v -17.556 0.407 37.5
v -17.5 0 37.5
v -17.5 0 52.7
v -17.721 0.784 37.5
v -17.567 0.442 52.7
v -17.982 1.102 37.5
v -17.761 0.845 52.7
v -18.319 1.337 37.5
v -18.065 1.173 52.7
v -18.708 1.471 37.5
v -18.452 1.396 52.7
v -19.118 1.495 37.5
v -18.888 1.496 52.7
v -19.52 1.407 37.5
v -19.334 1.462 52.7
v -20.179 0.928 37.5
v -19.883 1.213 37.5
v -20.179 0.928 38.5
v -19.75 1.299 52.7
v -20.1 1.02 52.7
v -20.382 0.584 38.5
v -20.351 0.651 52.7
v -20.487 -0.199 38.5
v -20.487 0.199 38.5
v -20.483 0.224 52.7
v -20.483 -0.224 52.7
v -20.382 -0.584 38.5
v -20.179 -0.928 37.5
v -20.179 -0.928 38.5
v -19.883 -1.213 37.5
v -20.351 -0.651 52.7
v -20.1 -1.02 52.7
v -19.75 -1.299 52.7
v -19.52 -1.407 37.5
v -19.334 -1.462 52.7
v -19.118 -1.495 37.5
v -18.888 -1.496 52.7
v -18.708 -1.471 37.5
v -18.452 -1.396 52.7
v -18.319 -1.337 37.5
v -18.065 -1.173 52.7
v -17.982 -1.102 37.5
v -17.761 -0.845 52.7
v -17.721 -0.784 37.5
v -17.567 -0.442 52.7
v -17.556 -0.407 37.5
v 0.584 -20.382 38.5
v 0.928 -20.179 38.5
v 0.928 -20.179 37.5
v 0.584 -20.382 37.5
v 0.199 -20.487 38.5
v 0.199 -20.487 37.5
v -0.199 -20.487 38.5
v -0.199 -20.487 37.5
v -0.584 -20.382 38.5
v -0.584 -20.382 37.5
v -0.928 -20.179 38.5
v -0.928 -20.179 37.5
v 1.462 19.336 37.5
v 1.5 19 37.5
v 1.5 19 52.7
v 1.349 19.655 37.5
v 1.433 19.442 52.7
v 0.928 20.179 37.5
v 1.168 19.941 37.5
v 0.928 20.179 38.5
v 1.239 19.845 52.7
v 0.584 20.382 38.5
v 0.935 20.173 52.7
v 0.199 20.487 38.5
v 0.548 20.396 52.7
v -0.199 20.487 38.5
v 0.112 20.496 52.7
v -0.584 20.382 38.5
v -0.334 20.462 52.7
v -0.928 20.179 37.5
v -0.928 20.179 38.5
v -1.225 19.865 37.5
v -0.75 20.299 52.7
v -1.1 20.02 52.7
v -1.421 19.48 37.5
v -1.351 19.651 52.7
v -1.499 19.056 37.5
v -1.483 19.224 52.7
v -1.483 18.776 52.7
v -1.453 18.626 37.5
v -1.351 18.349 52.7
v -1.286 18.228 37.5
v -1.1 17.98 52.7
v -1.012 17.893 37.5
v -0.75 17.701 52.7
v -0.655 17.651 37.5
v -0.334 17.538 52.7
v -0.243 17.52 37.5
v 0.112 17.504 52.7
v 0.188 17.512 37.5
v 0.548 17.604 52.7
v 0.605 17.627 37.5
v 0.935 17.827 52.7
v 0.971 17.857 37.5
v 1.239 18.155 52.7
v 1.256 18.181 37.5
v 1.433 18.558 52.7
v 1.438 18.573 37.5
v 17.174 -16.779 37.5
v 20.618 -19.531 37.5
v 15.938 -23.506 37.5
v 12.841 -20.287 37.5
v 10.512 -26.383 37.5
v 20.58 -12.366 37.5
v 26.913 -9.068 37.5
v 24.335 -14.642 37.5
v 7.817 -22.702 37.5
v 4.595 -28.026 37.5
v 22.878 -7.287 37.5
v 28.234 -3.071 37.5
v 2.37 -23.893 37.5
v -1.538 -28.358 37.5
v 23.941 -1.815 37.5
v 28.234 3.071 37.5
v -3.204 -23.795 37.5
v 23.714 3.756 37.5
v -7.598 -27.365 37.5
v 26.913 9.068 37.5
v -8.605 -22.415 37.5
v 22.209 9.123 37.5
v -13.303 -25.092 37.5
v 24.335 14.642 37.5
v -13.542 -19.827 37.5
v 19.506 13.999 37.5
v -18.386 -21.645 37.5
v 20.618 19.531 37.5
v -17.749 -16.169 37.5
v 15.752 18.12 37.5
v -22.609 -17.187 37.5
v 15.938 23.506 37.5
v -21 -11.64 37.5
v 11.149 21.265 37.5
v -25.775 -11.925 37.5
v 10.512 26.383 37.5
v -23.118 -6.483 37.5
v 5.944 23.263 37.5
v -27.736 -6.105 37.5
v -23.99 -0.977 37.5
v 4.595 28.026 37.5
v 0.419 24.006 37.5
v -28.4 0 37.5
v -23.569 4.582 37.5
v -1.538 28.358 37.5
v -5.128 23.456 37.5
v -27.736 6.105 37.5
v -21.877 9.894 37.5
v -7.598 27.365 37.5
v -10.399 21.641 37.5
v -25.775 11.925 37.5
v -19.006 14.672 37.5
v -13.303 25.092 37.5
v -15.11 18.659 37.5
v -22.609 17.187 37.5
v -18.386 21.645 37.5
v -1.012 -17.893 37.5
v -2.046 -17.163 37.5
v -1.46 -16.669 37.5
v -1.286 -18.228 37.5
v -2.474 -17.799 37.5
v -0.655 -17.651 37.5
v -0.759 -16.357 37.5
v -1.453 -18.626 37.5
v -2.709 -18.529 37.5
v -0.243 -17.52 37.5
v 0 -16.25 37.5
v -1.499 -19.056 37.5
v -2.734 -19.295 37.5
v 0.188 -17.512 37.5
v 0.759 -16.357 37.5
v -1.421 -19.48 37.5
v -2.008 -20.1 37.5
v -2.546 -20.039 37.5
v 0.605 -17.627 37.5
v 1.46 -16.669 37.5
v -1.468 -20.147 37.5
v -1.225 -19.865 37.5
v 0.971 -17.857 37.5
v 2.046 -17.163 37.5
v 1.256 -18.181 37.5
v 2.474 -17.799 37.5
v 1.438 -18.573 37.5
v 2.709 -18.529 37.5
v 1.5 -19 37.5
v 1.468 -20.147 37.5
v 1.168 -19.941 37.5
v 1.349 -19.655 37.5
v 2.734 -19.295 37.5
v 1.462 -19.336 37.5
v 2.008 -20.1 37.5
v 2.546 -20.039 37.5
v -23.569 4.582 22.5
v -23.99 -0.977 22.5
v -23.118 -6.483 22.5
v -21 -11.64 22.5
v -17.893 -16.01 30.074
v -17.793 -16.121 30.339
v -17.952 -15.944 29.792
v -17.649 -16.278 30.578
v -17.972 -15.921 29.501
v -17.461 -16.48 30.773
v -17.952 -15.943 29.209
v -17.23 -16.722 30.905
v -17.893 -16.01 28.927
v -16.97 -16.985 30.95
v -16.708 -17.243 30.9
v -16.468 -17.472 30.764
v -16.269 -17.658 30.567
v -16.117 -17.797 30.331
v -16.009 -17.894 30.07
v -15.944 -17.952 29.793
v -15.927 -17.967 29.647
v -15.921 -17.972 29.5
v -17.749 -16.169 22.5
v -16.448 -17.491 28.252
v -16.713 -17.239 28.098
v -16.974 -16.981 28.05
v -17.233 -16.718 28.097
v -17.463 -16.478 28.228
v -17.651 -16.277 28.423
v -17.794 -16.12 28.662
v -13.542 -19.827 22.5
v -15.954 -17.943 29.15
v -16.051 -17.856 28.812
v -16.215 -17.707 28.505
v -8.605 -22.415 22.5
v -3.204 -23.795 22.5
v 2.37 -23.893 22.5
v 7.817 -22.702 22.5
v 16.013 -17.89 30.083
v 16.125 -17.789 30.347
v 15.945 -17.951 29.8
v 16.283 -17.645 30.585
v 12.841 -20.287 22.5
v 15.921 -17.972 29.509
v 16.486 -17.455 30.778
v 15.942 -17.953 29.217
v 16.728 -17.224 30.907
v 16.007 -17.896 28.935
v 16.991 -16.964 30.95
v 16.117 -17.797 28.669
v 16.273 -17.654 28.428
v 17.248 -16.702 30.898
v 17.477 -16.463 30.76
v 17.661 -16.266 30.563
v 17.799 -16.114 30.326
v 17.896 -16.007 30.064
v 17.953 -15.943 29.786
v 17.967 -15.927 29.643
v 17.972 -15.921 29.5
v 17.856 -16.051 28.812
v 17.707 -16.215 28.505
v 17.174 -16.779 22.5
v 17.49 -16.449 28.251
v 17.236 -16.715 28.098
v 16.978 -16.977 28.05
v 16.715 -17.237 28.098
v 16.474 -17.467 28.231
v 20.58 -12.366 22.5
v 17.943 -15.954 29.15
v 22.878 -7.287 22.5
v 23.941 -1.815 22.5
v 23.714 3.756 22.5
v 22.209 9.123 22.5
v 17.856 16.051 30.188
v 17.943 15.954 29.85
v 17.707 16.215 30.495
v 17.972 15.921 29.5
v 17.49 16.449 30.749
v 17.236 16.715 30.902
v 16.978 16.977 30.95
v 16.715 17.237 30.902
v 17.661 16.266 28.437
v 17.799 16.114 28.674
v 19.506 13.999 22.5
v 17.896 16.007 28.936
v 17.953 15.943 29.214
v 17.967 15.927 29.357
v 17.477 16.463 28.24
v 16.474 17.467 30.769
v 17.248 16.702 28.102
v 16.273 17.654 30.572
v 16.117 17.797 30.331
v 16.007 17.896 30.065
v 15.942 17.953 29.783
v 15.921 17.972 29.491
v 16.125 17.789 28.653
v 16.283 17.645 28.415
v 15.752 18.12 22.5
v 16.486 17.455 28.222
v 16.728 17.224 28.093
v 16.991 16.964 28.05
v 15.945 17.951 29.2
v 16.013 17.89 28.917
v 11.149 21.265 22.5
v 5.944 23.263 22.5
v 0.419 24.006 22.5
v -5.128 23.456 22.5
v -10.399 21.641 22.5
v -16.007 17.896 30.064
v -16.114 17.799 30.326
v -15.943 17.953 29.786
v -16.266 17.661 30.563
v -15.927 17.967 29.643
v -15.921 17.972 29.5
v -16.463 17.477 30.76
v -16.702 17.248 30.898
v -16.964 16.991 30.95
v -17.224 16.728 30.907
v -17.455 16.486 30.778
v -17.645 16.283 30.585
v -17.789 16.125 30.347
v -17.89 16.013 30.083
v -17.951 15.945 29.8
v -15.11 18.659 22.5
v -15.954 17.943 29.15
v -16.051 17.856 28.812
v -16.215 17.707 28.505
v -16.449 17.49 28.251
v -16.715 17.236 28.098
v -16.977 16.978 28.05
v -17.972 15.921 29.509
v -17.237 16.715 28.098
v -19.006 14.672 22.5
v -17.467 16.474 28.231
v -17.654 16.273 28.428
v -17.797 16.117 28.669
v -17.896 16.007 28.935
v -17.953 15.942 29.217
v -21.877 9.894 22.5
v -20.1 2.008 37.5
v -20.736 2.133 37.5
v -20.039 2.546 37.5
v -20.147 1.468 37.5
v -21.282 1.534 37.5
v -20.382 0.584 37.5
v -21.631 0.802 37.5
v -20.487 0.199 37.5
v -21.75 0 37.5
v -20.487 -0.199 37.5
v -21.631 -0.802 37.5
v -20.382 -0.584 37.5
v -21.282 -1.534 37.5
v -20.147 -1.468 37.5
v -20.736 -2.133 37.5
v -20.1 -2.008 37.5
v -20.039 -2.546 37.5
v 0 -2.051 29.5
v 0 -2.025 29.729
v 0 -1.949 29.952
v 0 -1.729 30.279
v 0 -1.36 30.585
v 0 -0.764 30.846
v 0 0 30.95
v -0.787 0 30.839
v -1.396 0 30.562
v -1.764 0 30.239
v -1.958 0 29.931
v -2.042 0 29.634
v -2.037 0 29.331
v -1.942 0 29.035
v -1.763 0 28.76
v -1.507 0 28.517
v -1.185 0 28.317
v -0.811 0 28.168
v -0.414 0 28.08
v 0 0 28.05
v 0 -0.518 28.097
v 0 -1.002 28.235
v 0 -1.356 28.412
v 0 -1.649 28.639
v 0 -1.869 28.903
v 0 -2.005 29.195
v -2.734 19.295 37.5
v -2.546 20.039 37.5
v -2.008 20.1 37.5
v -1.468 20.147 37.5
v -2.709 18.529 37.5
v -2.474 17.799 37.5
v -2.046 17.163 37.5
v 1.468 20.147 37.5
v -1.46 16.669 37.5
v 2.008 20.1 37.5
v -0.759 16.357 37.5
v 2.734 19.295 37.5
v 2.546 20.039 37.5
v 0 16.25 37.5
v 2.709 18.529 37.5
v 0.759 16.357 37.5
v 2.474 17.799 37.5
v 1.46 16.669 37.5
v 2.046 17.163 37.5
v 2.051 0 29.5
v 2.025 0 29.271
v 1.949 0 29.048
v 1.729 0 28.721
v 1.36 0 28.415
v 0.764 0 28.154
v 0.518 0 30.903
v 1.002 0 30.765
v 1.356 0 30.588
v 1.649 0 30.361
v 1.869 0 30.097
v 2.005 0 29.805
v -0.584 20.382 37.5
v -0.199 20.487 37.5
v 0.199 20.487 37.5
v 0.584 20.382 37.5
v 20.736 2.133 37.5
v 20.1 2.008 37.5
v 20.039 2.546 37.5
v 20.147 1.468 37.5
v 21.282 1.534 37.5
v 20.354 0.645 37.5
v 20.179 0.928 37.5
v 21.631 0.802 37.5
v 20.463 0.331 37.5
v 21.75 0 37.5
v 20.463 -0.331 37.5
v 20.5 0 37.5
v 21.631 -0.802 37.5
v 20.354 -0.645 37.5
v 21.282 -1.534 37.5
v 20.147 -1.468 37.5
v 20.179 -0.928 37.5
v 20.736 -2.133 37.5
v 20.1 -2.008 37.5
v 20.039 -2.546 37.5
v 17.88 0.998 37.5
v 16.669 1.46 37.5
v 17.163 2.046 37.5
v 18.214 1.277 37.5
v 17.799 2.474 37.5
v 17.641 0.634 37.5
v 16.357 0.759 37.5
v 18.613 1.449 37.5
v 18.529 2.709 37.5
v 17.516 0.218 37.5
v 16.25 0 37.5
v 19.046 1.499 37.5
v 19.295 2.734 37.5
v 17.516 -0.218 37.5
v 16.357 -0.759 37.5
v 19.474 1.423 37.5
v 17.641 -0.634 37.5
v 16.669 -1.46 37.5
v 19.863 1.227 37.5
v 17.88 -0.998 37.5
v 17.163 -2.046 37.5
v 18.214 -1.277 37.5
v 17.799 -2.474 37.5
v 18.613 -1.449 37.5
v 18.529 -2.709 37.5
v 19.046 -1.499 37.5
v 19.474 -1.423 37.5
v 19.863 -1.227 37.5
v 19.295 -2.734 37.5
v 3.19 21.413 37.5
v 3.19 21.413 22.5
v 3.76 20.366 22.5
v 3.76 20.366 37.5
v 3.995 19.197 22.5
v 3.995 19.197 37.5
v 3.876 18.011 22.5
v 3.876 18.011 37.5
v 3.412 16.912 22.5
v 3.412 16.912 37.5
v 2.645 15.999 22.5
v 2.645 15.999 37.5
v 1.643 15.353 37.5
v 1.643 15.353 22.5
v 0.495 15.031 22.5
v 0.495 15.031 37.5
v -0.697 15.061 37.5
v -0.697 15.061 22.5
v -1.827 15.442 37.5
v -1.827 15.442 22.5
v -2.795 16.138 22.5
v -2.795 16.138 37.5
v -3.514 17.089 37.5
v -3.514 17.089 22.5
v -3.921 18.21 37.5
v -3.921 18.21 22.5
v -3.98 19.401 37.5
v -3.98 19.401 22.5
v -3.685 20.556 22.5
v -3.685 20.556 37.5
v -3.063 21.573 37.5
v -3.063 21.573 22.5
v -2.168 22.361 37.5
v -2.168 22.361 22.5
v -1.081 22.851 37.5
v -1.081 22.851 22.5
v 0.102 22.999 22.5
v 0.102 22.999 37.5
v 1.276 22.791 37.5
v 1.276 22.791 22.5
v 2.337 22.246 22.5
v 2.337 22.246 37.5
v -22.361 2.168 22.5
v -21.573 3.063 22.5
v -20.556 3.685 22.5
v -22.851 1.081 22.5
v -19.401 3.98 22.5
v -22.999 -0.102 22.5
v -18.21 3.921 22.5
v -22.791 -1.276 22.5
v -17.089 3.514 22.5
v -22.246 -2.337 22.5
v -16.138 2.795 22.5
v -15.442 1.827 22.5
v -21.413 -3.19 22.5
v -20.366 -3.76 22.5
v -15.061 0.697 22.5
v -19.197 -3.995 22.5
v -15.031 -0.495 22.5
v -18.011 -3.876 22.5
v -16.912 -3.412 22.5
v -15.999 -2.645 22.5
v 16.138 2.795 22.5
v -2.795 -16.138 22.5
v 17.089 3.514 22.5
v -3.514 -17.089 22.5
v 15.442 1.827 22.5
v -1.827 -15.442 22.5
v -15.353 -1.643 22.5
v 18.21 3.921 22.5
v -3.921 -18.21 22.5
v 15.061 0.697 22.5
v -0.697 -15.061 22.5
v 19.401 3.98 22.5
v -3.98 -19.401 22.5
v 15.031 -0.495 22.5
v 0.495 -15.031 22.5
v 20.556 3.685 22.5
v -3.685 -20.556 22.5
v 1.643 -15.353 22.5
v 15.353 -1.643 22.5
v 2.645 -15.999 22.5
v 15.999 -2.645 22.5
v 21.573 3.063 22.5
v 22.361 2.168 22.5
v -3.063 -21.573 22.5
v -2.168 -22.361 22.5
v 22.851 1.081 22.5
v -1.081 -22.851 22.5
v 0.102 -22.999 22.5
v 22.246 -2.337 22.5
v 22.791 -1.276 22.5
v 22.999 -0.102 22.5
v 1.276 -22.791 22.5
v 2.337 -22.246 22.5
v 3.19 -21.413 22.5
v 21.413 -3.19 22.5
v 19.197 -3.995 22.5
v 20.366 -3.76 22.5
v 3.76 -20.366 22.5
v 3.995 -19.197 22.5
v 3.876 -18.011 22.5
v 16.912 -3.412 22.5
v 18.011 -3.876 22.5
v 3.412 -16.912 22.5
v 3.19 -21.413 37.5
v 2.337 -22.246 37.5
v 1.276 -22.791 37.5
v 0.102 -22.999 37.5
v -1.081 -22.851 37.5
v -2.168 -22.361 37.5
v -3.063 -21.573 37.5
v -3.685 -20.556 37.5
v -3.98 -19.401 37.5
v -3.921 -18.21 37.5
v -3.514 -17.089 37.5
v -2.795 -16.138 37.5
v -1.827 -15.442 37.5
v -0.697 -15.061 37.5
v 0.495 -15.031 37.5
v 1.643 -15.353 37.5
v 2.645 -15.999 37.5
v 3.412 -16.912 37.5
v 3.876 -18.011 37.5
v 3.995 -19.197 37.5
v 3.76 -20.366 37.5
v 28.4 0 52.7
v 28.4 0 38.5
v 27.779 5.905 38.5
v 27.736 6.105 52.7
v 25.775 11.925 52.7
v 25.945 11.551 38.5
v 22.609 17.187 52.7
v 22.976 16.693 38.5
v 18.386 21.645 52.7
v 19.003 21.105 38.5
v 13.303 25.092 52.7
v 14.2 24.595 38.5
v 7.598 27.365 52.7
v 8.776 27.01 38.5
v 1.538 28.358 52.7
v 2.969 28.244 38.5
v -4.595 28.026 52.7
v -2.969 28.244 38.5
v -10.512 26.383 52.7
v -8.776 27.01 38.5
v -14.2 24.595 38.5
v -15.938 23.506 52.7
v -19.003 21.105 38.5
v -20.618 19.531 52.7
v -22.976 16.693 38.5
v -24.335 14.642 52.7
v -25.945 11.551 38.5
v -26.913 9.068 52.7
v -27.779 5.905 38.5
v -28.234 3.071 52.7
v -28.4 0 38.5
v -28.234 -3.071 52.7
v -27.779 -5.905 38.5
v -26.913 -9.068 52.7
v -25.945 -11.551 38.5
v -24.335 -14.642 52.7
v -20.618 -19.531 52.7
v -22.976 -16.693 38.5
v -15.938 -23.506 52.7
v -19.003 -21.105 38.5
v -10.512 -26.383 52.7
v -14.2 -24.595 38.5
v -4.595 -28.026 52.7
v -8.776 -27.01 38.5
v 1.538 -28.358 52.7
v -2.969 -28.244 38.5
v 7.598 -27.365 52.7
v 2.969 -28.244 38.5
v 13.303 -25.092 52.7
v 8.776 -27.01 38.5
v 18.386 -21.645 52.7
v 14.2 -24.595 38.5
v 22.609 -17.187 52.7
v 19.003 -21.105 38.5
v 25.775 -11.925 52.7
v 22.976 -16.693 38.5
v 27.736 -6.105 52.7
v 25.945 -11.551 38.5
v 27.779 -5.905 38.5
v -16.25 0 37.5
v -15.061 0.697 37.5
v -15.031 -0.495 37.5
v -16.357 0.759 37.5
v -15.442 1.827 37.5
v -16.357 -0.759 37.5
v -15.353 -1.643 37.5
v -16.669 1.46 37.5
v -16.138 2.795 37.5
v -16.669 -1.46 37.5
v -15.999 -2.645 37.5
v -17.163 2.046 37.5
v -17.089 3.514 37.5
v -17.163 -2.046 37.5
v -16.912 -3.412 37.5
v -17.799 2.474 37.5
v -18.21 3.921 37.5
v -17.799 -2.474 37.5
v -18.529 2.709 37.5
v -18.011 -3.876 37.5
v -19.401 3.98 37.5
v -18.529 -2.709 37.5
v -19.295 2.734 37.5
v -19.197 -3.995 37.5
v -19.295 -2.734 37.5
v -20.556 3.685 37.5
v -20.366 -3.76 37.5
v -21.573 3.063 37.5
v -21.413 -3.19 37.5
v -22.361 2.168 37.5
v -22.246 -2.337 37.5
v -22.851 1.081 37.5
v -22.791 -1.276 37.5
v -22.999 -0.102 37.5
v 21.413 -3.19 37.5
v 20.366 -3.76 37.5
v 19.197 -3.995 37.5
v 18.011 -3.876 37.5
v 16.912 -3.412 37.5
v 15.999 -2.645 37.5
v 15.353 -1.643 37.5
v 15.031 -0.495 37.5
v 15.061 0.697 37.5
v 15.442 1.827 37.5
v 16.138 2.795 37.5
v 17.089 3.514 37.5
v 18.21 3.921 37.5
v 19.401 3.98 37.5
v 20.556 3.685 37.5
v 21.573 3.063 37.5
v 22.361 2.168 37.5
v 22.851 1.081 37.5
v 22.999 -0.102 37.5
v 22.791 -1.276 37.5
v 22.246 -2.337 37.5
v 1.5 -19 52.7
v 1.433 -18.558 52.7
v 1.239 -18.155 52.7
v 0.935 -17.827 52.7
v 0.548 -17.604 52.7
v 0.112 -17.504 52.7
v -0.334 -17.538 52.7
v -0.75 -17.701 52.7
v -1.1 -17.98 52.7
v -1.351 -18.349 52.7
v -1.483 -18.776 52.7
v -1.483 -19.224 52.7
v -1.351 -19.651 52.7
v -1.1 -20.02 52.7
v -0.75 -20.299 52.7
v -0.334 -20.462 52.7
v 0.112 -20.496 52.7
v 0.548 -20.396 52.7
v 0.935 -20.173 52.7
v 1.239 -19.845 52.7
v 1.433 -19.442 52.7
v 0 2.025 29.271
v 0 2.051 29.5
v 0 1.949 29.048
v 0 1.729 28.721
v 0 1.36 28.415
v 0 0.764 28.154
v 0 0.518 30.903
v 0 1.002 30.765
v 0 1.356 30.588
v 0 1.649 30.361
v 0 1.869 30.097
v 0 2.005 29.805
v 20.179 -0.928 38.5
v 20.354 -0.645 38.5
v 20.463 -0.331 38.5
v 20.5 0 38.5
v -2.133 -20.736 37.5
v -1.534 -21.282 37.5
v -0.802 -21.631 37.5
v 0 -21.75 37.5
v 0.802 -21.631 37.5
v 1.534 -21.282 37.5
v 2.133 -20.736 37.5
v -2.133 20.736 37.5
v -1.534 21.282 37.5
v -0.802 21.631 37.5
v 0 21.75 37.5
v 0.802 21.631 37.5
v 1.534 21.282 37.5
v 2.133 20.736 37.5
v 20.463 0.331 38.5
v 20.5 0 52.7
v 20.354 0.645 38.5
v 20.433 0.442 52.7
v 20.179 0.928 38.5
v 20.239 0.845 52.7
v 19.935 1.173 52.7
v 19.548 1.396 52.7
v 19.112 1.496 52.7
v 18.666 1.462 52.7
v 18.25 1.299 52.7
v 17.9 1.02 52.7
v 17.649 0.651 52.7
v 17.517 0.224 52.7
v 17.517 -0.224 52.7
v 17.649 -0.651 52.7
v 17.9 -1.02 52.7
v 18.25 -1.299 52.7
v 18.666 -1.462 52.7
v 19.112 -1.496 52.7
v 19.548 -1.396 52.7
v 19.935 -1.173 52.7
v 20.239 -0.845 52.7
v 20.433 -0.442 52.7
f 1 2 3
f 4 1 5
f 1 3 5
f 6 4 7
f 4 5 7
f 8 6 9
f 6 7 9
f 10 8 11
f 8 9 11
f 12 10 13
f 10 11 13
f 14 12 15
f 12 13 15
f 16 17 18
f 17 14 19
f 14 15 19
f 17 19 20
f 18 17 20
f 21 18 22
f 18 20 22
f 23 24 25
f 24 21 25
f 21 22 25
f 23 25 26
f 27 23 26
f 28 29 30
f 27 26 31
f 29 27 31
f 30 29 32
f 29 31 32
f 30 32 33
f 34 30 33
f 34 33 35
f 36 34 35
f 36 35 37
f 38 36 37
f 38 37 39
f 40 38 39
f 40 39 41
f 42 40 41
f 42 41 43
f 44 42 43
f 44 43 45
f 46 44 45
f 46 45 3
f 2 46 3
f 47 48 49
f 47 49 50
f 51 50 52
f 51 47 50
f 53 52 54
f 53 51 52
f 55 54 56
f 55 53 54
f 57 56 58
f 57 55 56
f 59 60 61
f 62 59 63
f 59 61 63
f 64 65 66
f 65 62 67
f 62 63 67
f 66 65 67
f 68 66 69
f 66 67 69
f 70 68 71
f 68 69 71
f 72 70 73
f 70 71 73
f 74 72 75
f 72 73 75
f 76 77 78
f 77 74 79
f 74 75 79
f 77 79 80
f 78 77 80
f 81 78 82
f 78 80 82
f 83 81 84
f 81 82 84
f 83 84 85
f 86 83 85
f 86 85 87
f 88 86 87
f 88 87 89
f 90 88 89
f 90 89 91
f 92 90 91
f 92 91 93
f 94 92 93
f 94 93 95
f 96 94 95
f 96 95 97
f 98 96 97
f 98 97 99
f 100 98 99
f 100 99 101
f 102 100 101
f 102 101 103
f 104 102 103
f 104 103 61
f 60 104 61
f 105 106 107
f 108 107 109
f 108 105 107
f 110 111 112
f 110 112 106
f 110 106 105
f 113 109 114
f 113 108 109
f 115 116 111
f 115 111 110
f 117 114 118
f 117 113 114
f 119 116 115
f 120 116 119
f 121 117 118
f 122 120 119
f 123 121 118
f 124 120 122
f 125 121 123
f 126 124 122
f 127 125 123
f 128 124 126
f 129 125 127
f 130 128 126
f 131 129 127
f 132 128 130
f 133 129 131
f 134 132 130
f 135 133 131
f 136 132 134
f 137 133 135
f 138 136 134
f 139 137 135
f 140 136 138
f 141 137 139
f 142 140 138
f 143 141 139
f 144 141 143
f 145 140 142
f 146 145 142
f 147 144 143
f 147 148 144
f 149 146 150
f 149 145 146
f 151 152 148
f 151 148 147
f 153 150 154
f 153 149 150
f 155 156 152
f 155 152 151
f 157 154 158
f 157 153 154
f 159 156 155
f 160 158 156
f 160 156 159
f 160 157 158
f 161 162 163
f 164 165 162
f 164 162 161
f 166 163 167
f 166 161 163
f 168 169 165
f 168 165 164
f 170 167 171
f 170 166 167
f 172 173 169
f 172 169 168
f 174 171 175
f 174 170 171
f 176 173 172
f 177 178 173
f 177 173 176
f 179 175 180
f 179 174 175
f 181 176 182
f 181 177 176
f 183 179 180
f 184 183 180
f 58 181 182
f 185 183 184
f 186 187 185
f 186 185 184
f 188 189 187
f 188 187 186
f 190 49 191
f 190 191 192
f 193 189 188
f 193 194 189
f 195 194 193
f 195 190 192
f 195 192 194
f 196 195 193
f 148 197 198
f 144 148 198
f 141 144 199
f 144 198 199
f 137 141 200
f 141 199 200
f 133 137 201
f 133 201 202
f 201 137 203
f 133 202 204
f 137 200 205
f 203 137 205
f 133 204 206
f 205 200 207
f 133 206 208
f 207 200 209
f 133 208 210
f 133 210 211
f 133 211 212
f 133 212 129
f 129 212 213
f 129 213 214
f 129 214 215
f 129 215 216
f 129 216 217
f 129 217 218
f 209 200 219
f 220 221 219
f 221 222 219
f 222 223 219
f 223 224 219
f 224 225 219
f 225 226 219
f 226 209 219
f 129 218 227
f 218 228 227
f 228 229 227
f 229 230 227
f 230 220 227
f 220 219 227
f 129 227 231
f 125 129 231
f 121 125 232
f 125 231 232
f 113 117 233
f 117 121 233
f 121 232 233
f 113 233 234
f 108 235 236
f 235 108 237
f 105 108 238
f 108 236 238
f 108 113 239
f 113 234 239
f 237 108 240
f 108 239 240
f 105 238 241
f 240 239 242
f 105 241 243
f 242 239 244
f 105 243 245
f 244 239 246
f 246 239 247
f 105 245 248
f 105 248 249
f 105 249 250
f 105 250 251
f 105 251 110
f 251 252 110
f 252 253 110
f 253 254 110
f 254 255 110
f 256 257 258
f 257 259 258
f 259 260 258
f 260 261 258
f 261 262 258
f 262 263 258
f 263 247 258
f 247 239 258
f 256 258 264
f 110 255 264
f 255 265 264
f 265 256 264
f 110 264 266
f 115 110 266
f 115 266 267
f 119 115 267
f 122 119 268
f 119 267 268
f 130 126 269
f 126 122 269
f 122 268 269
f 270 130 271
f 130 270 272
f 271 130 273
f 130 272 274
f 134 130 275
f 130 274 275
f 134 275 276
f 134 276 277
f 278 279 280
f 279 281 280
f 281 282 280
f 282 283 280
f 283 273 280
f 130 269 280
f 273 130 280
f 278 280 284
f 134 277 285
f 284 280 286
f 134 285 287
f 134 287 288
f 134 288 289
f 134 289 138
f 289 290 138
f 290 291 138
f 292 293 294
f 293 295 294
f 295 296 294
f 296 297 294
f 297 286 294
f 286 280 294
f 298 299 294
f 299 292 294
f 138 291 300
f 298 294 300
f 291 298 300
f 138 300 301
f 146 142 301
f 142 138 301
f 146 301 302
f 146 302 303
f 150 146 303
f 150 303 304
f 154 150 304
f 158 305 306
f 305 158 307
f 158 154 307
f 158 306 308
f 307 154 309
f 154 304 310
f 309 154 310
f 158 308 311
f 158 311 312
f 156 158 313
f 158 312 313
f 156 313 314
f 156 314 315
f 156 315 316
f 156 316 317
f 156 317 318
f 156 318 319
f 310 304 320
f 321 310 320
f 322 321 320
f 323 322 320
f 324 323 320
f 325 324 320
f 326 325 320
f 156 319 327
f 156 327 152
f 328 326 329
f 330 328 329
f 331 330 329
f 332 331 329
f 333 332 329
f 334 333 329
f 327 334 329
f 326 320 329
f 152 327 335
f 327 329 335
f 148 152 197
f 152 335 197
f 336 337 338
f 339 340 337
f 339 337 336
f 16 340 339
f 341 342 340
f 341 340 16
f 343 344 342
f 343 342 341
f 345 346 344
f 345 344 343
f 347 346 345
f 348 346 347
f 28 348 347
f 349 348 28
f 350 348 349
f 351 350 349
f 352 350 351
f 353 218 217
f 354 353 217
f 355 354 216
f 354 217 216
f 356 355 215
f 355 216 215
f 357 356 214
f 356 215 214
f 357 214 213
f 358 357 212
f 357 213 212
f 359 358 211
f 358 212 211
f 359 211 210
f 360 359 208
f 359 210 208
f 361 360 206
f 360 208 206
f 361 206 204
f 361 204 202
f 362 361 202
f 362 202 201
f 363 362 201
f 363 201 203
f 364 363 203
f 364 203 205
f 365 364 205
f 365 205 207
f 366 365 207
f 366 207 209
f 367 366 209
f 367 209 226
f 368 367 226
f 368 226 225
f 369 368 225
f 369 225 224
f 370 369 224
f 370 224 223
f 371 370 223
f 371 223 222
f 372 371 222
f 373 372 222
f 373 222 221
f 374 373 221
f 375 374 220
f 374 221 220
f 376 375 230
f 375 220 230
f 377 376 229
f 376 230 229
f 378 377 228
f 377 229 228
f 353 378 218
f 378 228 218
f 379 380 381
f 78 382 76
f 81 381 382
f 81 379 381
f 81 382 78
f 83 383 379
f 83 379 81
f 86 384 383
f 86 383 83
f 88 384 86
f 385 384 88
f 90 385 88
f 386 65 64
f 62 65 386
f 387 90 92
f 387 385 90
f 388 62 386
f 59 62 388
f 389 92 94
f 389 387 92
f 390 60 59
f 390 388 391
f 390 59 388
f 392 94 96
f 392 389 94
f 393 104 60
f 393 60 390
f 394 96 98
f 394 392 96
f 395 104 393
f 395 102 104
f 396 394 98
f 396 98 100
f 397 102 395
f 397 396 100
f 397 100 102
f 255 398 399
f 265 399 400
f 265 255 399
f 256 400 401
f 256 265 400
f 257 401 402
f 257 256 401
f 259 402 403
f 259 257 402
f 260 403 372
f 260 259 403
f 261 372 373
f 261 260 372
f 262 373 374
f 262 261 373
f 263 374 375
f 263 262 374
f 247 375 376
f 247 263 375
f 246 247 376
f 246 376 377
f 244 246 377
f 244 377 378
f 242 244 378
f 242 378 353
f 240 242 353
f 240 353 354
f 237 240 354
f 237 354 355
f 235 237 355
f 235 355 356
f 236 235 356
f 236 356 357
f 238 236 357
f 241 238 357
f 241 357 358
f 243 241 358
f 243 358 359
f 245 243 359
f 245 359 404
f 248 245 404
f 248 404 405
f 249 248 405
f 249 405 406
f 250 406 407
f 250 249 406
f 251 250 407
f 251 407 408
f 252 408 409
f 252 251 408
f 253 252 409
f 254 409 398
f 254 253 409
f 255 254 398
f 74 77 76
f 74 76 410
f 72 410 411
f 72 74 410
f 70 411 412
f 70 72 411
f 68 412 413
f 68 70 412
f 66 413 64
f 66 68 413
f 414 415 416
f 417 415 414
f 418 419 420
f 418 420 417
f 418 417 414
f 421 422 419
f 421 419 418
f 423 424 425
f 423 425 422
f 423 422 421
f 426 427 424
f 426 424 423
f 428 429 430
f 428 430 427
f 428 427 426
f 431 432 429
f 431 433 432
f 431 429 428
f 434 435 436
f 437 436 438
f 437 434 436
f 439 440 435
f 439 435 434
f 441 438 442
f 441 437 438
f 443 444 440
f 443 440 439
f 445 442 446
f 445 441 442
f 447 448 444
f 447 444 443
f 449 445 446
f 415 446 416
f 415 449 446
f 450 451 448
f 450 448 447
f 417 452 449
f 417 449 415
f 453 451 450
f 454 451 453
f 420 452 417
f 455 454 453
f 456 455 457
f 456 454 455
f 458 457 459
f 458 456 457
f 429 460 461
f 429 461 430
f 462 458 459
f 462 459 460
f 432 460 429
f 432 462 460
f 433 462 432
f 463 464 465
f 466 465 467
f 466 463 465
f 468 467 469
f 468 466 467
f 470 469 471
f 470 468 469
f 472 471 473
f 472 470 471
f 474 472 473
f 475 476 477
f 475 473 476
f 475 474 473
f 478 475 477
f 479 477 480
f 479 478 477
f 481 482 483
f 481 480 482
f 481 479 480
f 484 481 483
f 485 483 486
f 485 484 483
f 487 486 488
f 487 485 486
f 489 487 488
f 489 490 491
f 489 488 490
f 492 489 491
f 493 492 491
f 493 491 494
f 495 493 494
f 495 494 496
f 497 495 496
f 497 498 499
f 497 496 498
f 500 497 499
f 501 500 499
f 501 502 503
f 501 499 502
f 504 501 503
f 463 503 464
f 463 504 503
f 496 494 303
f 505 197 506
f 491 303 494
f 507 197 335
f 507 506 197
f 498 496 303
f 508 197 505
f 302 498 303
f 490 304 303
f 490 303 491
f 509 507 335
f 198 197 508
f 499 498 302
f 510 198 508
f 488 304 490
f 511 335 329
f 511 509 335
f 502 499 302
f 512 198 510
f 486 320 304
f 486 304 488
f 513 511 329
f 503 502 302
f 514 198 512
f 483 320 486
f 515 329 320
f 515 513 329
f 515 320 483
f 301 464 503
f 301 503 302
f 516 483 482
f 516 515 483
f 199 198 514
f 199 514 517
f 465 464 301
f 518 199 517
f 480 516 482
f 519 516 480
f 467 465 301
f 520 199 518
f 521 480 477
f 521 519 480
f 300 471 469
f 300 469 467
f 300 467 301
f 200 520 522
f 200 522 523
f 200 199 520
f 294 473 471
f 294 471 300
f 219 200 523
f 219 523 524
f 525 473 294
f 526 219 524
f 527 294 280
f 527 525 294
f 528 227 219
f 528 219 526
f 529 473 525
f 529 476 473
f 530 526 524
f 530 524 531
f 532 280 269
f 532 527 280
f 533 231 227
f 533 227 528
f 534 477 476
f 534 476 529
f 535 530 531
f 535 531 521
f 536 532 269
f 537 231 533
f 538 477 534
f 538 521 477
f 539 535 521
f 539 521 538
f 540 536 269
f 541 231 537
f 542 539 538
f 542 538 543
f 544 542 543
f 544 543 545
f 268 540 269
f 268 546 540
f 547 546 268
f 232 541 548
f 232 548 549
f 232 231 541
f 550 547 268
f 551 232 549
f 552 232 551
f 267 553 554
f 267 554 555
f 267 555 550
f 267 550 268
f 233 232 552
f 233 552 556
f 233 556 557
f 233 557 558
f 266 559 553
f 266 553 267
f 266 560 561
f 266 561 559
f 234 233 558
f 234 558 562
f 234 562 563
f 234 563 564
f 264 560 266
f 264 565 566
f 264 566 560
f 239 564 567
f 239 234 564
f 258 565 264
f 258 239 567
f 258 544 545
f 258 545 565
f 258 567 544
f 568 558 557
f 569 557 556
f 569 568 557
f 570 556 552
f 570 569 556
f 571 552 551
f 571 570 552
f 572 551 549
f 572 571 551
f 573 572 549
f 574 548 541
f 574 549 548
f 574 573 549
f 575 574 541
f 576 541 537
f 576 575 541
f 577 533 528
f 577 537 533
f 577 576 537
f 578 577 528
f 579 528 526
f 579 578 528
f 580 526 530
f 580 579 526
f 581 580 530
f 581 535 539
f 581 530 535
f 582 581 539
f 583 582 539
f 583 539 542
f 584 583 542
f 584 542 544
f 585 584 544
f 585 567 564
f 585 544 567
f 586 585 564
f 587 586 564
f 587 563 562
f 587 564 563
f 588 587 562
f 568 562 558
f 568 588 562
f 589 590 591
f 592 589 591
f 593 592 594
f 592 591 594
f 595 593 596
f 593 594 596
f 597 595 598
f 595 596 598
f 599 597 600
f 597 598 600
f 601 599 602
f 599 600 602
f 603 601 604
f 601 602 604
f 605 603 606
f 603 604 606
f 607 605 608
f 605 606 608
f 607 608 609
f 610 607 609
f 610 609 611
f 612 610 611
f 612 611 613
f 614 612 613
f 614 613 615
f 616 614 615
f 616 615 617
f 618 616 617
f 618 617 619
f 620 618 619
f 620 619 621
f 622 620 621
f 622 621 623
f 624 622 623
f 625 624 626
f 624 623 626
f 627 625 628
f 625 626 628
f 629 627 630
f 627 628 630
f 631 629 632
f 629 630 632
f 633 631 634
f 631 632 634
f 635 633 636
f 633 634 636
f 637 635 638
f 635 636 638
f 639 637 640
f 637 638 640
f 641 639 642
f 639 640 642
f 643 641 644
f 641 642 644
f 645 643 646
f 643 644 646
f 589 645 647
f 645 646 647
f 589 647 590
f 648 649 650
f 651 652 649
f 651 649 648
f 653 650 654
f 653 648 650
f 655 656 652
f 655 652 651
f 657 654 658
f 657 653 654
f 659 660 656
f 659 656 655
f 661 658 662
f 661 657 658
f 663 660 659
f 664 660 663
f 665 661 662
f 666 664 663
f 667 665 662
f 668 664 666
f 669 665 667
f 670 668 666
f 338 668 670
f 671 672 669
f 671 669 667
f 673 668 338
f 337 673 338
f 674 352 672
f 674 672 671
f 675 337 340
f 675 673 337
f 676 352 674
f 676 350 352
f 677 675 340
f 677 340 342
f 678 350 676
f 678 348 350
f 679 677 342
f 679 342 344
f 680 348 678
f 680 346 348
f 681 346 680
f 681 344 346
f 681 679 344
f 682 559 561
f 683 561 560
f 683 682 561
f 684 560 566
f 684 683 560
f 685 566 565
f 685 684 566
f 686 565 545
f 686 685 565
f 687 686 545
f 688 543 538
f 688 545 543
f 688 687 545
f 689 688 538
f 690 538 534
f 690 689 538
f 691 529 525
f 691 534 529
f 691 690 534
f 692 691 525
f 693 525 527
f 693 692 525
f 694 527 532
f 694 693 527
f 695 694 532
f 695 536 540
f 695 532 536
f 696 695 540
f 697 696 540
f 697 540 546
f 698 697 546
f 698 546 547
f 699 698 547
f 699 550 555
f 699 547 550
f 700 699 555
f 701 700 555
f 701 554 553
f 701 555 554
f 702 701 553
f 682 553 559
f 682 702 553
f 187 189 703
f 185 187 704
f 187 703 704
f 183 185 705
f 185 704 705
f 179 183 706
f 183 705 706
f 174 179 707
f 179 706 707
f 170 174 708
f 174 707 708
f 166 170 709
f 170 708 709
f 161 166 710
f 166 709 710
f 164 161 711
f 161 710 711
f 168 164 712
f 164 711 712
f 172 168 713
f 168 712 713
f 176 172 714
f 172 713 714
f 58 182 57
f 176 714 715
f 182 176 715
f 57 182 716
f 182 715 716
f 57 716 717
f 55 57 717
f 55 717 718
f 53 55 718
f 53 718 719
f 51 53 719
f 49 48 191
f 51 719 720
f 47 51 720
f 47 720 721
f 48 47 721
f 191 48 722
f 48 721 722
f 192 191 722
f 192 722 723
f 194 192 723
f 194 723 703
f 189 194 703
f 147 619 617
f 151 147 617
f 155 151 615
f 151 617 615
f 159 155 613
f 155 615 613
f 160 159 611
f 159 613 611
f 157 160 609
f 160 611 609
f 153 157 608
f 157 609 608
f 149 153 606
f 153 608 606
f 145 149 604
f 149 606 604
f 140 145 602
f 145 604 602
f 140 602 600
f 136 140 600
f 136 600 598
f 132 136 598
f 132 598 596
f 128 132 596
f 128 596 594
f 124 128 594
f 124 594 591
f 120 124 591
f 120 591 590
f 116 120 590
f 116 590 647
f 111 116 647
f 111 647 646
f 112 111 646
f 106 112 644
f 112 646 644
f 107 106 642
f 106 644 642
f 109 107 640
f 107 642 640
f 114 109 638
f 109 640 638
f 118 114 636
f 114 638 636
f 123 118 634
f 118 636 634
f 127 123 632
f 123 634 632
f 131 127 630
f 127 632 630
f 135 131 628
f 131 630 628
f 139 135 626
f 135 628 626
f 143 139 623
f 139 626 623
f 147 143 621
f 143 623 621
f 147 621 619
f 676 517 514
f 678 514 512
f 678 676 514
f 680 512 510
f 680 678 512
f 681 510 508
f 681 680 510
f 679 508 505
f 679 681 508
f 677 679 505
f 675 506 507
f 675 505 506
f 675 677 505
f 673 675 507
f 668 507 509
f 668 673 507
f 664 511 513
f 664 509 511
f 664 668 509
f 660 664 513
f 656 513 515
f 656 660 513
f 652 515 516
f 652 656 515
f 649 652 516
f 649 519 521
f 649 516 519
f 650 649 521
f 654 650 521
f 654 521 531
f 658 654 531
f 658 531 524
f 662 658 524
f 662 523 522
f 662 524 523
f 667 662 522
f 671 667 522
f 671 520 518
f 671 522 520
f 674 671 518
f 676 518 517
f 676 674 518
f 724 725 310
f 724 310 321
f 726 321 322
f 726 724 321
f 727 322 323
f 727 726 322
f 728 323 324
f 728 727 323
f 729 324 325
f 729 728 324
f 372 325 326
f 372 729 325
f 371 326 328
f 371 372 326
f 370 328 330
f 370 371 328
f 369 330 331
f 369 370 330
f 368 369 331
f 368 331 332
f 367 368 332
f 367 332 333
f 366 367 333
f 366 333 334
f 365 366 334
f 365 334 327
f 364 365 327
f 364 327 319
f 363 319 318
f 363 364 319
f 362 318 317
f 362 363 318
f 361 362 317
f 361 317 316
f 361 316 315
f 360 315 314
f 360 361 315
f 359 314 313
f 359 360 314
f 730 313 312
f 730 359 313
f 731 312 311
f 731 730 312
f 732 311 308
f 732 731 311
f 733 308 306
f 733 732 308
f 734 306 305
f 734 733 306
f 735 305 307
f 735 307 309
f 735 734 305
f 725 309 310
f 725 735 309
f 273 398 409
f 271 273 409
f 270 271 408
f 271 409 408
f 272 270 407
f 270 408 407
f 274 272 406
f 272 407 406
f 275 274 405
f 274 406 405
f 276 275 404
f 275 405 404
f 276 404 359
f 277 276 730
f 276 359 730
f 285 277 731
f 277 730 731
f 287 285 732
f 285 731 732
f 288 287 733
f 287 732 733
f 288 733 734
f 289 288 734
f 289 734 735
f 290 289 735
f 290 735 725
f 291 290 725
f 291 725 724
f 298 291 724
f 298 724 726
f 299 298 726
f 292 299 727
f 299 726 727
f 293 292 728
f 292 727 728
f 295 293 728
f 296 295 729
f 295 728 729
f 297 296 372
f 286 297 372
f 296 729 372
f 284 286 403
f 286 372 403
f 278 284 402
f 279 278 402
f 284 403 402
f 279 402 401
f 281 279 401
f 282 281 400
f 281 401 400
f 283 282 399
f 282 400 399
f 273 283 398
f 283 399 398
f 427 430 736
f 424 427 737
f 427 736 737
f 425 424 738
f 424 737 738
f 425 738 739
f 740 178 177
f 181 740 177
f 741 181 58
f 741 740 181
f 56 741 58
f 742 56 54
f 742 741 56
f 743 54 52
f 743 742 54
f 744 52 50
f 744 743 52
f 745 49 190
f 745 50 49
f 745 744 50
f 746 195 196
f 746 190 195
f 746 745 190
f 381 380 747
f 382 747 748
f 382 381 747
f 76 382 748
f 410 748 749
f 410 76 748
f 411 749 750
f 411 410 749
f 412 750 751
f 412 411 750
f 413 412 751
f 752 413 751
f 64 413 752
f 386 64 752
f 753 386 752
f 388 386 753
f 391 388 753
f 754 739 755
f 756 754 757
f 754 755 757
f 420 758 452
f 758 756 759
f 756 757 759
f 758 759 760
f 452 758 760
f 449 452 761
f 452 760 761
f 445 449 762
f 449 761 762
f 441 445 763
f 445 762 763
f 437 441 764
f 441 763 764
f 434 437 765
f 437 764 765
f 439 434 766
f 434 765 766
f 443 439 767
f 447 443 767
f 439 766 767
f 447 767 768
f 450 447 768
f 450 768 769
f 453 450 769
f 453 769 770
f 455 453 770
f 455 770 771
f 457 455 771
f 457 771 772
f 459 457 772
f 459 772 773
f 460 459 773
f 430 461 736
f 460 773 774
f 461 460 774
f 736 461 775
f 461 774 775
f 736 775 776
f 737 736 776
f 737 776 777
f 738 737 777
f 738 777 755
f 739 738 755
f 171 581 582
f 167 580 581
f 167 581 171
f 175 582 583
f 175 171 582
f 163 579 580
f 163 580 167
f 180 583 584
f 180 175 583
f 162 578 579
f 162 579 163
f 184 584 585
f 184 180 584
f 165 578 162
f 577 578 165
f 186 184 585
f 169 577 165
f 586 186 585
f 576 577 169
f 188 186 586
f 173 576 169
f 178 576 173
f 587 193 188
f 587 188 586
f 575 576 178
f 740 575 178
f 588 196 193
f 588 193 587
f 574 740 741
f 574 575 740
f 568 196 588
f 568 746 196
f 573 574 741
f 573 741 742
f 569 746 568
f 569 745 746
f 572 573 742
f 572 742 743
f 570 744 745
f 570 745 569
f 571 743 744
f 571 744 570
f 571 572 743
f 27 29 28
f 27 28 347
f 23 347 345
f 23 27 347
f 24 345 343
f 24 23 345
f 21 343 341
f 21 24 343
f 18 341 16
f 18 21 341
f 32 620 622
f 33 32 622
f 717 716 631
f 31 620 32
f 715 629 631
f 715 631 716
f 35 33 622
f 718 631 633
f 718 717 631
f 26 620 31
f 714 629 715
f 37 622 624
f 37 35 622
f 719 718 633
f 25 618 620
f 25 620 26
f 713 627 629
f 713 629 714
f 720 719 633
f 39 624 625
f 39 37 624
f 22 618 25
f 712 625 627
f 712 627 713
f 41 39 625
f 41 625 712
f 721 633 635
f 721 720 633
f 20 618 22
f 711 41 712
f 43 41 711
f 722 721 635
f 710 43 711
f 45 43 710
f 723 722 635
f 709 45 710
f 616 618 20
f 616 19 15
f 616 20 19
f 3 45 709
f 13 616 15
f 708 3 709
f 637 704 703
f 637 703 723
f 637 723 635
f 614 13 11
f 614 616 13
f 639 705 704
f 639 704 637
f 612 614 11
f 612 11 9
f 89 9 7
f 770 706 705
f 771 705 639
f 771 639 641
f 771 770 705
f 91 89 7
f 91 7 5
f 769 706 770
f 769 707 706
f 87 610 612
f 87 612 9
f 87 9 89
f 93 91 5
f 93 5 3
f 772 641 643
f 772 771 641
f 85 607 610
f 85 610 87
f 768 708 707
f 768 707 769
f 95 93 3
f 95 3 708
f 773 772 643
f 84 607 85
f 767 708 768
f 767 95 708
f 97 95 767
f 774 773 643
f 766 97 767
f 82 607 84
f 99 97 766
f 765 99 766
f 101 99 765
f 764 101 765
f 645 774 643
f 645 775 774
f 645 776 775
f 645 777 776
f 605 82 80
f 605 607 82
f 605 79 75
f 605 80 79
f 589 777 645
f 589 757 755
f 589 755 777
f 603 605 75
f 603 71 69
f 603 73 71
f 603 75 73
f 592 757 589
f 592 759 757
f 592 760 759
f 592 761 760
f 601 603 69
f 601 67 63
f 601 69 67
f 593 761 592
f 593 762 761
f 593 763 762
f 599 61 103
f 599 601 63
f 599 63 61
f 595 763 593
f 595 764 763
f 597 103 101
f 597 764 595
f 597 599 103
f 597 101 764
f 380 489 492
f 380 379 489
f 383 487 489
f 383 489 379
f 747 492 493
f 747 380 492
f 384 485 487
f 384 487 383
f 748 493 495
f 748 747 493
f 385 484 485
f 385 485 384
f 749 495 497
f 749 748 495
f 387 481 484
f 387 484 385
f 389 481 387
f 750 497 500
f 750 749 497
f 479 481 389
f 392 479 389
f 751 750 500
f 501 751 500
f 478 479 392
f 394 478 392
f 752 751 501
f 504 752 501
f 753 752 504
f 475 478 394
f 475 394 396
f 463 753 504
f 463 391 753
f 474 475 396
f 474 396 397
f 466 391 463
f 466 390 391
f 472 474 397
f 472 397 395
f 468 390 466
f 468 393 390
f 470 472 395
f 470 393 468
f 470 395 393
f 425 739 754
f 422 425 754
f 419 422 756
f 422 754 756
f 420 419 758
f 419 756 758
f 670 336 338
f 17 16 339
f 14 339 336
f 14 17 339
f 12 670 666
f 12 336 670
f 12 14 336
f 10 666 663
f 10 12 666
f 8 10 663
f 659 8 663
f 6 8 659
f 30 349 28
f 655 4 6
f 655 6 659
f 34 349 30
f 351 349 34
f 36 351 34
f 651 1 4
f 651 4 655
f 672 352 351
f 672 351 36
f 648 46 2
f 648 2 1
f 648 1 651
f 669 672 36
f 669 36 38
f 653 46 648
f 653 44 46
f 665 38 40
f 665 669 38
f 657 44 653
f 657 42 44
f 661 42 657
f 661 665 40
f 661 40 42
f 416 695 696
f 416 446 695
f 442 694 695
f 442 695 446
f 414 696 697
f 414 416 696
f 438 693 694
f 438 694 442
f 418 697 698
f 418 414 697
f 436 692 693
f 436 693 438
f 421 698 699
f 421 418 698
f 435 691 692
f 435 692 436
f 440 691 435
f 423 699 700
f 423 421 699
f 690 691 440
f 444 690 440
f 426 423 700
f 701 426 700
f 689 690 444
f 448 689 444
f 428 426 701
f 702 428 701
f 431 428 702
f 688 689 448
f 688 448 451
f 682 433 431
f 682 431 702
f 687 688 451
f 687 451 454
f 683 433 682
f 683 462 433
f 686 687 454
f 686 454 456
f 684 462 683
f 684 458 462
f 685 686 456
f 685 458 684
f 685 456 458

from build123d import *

# Parameters (mm, degrees)
SKETCH_1_R               = 37.5
EXTRUDE_1_DEPTH          = 15.5
SKETCH_2_R               = 3
CUT_EXTRUDE_1_DEPTH      = 16
SKETCH_4_R               = 4.8
CUT_EXTRUDE_2_DEPTH      = 4.5
SKETCH_6_R               = 24.01
EXTRUDE_2_DEPTH          = 23
SKETCH_7_R               = 28.4
EXTRUDE_3_DEPTH          = 14.2
SKETCH_5_R               = 1.5
CUT_EXTRUDE_3_DEPTH      = 33
SKETCH_9_R               = 2.75
CUT_EXTRUDE_6_DEPTH      = 58
EXTRUDE_START            = -1
SKETCH_10_R              = 28.4
EXTRUDE_5_DEPTH          = 1
SKETCH_11_R              = 4
CUT_EXTRUDE_7_DEPTH      = 22
CUT_EXTRUDE_9_DEPTH      = 74
CUT_EXTRUDE_9_DEPTH_BACK = 74
SKETCH_15_R              = 1.45
CUT_EXTRUDE_10_DEPTH     = 74
SKETCH_16_R              = 1.45
CUT_EXTRUDE_11_DEPTH     = 74


with BuildPart() as part:
    # 草图1 → 凸台-拉伸1 (new body)
    with BuildSketch(Plane.XY):
        Circle(SKETCH_1_R)
    extrude(amount=EXTRUDE_1_DEPTH)

    # 草图2 → 切除-拉伸1 (cut)
    with BuildSketch(Plane(origin=(0, 0, 0), x_dir=(-1, 0, 0), z_dir=(0, 0, -1))):
        with Locations((-25, 0)):
            Circle(SKETCH_2_R)
        with Locations((25, 0)):
            Circle(SKETCH_2_R)
        with Locations((0, 25)):
            Circle(SKETCH_2_R)
        with Locations((0, -25)):
            Circle(SKETCH_2_R)
    extrude(amount=-CUT_EXTRUDE_1_DEPTH, mode=Mode.SUBTRACT)

    # 草图4 → 切除-拉伸2 (cut)
    with BuildSketch(Plane.XY.offset(15.5)):
        with Locations((-25, 0)):
            Circle(SKETCH_4_R)
        with Locations((25, 0)):
            Circle(SKETCH_4_R)
        with Locations((0, 25)):
            Circle(SKETCH_4_R)
        with Locations((0, -25)):
            Circle(SKETCH_4_R)
    extrude(amount=-CUT_EXTRUDE_2_DEPTH, mode=Mode.SUBTRACT)

    # 草图6 → 凸台-拉伸2 (add)
    with BuildSketch(Plane.XY.offset(15.5)):
        Circle(SKETCH_6_R)
    extrude(amount=EXTRUDE_2_DEPTH)

    # 草图7 → 凸台-拉伸3 (add)
    with BuildSketch(Plane.XY.offset(38.5)):
        Circle(SKETCH_7_R)
    extrude(amount=EXTRUDE_3_DEPTH)

    # 草图5 → 切除-拉伸3 (cut)
    with BuildSketch(Plane.XY.offset(52.7)):
        with Locations((-19, 0)):
            Circle(SKETCH_5_R)
        with Locations((19, 0)):
            Circle(SKETCH_5_R)
        with Locations((0, 19)):
            Circle(SKETCH_5_R)
        with Locations((0, -19)):
            Circle(SKETCH_5_R)
    extrude(amount=-CUT_EXTRUDE_3_DEPTH, mode=Mode.SUBTRACT)

    # 草图9 → 切除-拉伸6 (cut)
    with BuildSketch(Plane(origin=(0, 0, 37.5), x_dir=(-1, 0, 0), z_dir=(0, 0, -1))):
        with Locations((-19, 0)):
            Circle(SKETCH_9_R)
        with Locations((0, 19)):
            Circle(SKETCH_9_R)
        with Locations((19, 0)):
            Circle(SKETCH_9_R)
        with Locations((0, -19)):
            Circle(SKETCH_9_R)
    extrude(amount=CUT_EXTRUDE_6_DEPTH, mode=Mode.SUBTRACT)

    # 草图10 → 凸台-拉伸5 (add)
    with BuildSketch(Plane(origin=(0, 0, 37.5), x_dir=(-1, 0, 0), z_dir=(0, 0, -1)).offset(EXTRUDE_START)):
        Circle(SKETCH_10_R)
        with BuildLine():
            ThreePointArc((-0.927741091, -20.178684211), (0, -20.5), (0.927741091, -20.178684211))
            ThreePointArc((0.927741091, -20.178684211), (14.28355698, -14.28355698), (20.178684211, -0.927741091))
            ThreePointArc((20.178684211, -0.927741091), (20.5, 0), (20.178684211, 0.927741091))
            ThreePointArc((20.178684211, 0.927741091), (14.28355698, 14.28355698), (0.927741091, 20.178684211))
            ThreePointArc((0.927741091, 20.178684211), (0, 20.5), (-0.927741091, 20.178684211))
            ThreePointArc((-0.927741091, 20.178684211), (-14.28355698, 14.28355698), (-20.178684211, 0.927741091))
            ThreePointArc((-20.178684211, 0.927741091), (-20.5, 0), (-20.178684211, -0.927741091))
            ThreePointArc((-20.178684211, -0.927741091), (-14.28355698, -14.28355698), (-0.927741091, -20.178684211))
        make_face(mode=Mode.SUBTRACT)
    extrude(amount=EXTRUDE_5_DEPTH)

    # 草图11 → 切除-拉伸7 (cut)
    with BuildSketch(Plane(origin=(0, 0, 37.5), x_dir=(-1, 0, 0), z_dir=(0, 0, -1))):
        with Locations((0, 19)):
            Circle(SKETCH_11_R)
        with Locations((-19, 0)):
            Circle(SKETCH_11_R)
        with Locations((19, 0)):
            Circle(SKETCH_11_R)
        with Locations((0, -19)):
            Circle(SKETCH_11_R)
    extrude(amount=CUT_EXTRUDE_7_DEPTH, mode=Mode.SUBTRACT)

    # 草图13 → 切除-拉伸9 (cut, two sides: drawn at the far end of the back side and taken through both)
    with BuildSketch(Plane(origin=(0, 0, 0), x_dir=(1, 0, 0), z_dir=(0, 1, 0)).offset(-CUT_EXTRUDE_9_DEPTH_BACK)):
        Polygon((-52.212490612, -22.5), (-52.212490612, 12.620192268), (47.798391164, 12.620192268), (47.798391164, -22.5), (0, -22.5), align=None)
    extrude(amount=CUT_EXTRUDE_9_DEPTH + CUT_EXTRUDE_9_DEPTH_BACK, mode=Mode.SUBTRACT)

    # 草图15 → 切除-拉伸10 (cut)
    with BuildSketch(Plane(origin=(16.977633816, -16.977633816, 0), x_dir=(0.7071067811865477, 0.7071067811865475, 0), z_dir=(-0.7071067811865475, 0.7071067811865477, 0))):
        with Locations((0, -29.5)):
            Circle(SKETCH_15_R)
    extrude(amount=CUT_EXTRUDE_10_DEPTH, mode=Mode.SUBTRACT)

    # 草图16 → 切除-拉伸11 (cut)
    with BuildSketch(Plane(origin=(-16.977633816, -16.977633816, 0), x_dir=(0, 0, 1), z_dir=(-0.7071067811865476, -0.7071067811865476, 0))):
        with Locations((29.5, 0)):
            Circle(SKETCH_16_R)
    extrude(amount=-CUT_EXTRUDE_11_DEPTH, mode=Mode.SUBTRACT)


solid = part.part
